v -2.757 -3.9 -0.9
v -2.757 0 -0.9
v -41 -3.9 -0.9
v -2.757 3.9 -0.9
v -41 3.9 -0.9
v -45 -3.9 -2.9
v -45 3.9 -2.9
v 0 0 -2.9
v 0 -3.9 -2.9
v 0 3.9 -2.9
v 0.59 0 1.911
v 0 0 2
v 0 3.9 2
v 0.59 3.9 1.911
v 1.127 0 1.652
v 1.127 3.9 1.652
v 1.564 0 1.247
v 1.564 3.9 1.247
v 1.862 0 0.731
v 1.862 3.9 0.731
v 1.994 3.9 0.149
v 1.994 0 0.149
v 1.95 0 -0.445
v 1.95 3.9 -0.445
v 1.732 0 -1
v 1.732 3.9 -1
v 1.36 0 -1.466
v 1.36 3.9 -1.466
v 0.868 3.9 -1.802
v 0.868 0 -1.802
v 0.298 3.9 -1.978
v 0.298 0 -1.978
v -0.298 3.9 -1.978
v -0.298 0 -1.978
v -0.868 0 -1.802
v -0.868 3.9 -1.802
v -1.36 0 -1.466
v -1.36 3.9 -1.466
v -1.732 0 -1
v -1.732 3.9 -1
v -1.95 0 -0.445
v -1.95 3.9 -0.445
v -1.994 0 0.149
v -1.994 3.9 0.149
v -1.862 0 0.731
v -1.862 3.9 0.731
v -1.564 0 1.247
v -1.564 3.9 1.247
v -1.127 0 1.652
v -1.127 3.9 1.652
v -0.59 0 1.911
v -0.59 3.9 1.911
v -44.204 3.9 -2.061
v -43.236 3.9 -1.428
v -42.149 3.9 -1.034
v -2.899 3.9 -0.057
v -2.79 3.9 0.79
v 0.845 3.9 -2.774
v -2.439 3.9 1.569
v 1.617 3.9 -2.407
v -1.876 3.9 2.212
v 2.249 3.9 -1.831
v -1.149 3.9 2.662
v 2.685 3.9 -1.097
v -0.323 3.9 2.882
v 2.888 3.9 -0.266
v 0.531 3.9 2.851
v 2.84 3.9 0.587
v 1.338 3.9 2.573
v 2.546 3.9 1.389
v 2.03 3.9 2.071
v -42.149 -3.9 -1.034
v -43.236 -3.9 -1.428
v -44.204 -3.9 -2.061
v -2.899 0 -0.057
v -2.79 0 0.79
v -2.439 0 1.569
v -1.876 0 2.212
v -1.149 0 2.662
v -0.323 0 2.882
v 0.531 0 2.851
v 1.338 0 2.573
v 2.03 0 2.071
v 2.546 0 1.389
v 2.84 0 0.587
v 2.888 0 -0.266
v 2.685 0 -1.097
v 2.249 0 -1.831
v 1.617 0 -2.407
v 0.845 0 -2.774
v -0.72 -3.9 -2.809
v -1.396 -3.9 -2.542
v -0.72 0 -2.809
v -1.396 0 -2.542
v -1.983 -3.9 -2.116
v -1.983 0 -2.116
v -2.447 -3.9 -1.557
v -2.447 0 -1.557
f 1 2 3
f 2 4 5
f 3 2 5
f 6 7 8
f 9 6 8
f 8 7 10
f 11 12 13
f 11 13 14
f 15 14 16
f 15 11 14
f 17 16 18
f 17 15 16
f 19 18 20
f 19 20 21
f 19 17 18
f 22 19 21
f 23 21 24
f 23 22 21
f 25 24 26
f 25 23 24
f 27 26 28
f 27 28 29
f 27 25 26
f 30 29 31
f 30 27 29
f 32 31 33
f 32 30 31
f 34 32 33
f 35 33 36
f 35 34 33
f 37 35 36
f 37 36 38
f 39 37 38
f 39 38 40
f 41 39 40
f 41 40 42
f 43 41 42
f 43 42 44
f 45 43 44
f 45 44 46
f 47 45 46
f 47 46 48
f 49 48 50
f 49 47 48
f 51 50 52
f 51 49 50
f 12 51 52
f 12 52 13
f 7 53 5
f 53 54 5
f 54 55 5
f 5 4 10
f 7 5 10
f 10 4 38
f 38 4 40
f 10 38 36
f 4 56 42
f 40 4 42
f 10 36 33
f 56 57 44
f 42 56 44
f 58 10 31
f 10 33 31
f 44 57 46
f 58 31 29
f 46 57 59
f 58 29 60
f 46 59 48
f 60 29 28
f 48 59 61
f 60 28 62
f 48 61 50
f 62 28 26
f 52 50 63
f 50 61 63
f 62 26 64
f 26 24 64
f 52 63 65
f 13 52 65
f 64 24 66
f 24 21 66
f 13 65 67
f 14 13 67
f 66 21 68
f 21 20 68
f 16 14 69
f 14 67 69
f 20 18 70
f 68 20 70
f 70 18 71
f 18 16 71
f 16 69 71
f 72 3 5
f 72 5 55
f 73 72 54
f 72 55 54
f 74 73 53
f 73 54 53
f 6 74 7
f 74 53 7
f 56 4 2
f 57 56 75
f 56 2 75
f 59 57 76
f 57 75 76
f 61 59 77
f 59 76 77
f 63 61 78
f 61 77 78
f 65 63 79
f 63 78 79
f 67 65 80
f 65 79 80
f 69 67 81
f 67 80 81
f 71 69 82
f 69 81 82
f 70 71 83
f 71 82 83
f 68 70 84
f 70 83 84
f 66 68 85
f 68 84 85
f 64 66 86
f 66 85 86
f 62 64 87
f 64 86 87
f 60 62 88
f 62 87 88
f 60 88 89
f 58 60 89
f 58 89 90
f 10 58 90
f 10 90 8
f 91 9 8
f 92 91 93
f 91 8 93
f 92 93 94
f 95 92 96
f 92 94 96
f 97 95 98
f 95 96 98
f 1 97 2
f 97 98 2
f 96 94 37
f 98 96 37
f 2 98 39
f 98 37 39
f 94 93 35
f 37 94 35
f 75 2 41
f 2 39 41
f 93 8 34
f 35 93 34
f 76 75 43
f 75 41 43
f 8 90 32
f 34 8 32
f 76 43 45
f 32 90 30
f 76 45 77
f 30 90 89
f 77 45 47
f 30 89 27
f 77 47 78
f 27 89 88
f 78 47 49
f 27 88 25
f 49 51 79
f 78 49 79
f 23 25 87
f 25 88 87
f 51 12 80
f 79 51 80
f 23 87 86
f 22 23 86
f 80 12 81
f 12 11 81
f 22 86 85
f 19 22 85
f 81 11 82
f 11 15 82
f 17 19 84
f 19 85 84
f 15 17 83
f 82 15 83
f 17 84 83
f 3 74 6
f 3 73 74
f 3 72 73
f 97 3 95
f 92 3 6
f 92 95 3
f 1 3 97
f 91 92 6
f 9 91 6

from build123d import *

# Parameters (mm, degrees)
CROQUIS1_R                   = 2.9
CROQUIS1_R_2                 = 2
SALIENTE_EXTRUIR1_DEPTH      = 3.9
SALIENTE_EXTRUIR2_DEPTH      = 3.9
SALIENTE_EXTRUIR2_DEPTH_BACK = 3.9
REDONDEO1_R                  = 5


with BuildPart() as part:
    # Croquis1 → Saliente-Extruir1 (new body)
    with BuildSketch(Plane(origin=(0, 0, 0), x_dir=(1, 0, 0), z_dir=(0, 1, 0))):
        with Locations(Location((0, 0, 0), (0, 0, 270))):
            Circle(CROQUIS1_R)
        with Locations(Location((0, 0, 0), (0, 0, 270))):
            Circle(CROQUIS1_R_2, mode=Mode.SUBTRACT)
    extrude(amount=SALIENTE_EXTRUIR1_DEPTH)

    # Croquis2 → Saliente-Extruir2 (add, two sides: drawn at the far end of the back side and taken through both)
    with BuildSketch(Plane.XZ.offset(-SALIENTE_EXTRUIR2_DEPTH_BACK)):
        with BuildLine():
            Line((-45, -2.9), (0, -2.9))
            ThreePointArc((0, -2.9), (-1.702938637, -2.347338919), (-2.75680975, -0.9))
            Line((-2.75680975, -0.9), (-45, -0.9))
            Line((-45, -0.9), (-45, -2.9))
        make_face()
    extrude(amount=SALIENTE_EXTRUIR2_DEPTH + SALIENTE_EXTRUIR2_DEPTH_BACK)

    # Redondeo1
    # the kernel refuses this fillet: 5 mm, written as the material it takes off along each edge
    with BuildSketch(Plane(origin=(-45, 13.9, -0.9), x_dir=(0, 0, -1), z_dir=(0, -1, 0))) as redondeo1_piece_1:
        with BuildLine():
            CenterArc((5, 4), REDONDEO1_R, 180, 53.130102354)
            Line((0, 4), (-0.1, 4))
            Line((-0.1, 4), (-0.1, 0))
            Line((-0.1, 0), (0, -0.1))
            ThreePointArc((0, -0.1), (1, -0.1), (1.94, -0.08))
            Line((1.94, -0.08), (2, 0))
        make_face()
    extrude(amount=27.8, mode=Mode.SUBTRACT)


solid = part.part
